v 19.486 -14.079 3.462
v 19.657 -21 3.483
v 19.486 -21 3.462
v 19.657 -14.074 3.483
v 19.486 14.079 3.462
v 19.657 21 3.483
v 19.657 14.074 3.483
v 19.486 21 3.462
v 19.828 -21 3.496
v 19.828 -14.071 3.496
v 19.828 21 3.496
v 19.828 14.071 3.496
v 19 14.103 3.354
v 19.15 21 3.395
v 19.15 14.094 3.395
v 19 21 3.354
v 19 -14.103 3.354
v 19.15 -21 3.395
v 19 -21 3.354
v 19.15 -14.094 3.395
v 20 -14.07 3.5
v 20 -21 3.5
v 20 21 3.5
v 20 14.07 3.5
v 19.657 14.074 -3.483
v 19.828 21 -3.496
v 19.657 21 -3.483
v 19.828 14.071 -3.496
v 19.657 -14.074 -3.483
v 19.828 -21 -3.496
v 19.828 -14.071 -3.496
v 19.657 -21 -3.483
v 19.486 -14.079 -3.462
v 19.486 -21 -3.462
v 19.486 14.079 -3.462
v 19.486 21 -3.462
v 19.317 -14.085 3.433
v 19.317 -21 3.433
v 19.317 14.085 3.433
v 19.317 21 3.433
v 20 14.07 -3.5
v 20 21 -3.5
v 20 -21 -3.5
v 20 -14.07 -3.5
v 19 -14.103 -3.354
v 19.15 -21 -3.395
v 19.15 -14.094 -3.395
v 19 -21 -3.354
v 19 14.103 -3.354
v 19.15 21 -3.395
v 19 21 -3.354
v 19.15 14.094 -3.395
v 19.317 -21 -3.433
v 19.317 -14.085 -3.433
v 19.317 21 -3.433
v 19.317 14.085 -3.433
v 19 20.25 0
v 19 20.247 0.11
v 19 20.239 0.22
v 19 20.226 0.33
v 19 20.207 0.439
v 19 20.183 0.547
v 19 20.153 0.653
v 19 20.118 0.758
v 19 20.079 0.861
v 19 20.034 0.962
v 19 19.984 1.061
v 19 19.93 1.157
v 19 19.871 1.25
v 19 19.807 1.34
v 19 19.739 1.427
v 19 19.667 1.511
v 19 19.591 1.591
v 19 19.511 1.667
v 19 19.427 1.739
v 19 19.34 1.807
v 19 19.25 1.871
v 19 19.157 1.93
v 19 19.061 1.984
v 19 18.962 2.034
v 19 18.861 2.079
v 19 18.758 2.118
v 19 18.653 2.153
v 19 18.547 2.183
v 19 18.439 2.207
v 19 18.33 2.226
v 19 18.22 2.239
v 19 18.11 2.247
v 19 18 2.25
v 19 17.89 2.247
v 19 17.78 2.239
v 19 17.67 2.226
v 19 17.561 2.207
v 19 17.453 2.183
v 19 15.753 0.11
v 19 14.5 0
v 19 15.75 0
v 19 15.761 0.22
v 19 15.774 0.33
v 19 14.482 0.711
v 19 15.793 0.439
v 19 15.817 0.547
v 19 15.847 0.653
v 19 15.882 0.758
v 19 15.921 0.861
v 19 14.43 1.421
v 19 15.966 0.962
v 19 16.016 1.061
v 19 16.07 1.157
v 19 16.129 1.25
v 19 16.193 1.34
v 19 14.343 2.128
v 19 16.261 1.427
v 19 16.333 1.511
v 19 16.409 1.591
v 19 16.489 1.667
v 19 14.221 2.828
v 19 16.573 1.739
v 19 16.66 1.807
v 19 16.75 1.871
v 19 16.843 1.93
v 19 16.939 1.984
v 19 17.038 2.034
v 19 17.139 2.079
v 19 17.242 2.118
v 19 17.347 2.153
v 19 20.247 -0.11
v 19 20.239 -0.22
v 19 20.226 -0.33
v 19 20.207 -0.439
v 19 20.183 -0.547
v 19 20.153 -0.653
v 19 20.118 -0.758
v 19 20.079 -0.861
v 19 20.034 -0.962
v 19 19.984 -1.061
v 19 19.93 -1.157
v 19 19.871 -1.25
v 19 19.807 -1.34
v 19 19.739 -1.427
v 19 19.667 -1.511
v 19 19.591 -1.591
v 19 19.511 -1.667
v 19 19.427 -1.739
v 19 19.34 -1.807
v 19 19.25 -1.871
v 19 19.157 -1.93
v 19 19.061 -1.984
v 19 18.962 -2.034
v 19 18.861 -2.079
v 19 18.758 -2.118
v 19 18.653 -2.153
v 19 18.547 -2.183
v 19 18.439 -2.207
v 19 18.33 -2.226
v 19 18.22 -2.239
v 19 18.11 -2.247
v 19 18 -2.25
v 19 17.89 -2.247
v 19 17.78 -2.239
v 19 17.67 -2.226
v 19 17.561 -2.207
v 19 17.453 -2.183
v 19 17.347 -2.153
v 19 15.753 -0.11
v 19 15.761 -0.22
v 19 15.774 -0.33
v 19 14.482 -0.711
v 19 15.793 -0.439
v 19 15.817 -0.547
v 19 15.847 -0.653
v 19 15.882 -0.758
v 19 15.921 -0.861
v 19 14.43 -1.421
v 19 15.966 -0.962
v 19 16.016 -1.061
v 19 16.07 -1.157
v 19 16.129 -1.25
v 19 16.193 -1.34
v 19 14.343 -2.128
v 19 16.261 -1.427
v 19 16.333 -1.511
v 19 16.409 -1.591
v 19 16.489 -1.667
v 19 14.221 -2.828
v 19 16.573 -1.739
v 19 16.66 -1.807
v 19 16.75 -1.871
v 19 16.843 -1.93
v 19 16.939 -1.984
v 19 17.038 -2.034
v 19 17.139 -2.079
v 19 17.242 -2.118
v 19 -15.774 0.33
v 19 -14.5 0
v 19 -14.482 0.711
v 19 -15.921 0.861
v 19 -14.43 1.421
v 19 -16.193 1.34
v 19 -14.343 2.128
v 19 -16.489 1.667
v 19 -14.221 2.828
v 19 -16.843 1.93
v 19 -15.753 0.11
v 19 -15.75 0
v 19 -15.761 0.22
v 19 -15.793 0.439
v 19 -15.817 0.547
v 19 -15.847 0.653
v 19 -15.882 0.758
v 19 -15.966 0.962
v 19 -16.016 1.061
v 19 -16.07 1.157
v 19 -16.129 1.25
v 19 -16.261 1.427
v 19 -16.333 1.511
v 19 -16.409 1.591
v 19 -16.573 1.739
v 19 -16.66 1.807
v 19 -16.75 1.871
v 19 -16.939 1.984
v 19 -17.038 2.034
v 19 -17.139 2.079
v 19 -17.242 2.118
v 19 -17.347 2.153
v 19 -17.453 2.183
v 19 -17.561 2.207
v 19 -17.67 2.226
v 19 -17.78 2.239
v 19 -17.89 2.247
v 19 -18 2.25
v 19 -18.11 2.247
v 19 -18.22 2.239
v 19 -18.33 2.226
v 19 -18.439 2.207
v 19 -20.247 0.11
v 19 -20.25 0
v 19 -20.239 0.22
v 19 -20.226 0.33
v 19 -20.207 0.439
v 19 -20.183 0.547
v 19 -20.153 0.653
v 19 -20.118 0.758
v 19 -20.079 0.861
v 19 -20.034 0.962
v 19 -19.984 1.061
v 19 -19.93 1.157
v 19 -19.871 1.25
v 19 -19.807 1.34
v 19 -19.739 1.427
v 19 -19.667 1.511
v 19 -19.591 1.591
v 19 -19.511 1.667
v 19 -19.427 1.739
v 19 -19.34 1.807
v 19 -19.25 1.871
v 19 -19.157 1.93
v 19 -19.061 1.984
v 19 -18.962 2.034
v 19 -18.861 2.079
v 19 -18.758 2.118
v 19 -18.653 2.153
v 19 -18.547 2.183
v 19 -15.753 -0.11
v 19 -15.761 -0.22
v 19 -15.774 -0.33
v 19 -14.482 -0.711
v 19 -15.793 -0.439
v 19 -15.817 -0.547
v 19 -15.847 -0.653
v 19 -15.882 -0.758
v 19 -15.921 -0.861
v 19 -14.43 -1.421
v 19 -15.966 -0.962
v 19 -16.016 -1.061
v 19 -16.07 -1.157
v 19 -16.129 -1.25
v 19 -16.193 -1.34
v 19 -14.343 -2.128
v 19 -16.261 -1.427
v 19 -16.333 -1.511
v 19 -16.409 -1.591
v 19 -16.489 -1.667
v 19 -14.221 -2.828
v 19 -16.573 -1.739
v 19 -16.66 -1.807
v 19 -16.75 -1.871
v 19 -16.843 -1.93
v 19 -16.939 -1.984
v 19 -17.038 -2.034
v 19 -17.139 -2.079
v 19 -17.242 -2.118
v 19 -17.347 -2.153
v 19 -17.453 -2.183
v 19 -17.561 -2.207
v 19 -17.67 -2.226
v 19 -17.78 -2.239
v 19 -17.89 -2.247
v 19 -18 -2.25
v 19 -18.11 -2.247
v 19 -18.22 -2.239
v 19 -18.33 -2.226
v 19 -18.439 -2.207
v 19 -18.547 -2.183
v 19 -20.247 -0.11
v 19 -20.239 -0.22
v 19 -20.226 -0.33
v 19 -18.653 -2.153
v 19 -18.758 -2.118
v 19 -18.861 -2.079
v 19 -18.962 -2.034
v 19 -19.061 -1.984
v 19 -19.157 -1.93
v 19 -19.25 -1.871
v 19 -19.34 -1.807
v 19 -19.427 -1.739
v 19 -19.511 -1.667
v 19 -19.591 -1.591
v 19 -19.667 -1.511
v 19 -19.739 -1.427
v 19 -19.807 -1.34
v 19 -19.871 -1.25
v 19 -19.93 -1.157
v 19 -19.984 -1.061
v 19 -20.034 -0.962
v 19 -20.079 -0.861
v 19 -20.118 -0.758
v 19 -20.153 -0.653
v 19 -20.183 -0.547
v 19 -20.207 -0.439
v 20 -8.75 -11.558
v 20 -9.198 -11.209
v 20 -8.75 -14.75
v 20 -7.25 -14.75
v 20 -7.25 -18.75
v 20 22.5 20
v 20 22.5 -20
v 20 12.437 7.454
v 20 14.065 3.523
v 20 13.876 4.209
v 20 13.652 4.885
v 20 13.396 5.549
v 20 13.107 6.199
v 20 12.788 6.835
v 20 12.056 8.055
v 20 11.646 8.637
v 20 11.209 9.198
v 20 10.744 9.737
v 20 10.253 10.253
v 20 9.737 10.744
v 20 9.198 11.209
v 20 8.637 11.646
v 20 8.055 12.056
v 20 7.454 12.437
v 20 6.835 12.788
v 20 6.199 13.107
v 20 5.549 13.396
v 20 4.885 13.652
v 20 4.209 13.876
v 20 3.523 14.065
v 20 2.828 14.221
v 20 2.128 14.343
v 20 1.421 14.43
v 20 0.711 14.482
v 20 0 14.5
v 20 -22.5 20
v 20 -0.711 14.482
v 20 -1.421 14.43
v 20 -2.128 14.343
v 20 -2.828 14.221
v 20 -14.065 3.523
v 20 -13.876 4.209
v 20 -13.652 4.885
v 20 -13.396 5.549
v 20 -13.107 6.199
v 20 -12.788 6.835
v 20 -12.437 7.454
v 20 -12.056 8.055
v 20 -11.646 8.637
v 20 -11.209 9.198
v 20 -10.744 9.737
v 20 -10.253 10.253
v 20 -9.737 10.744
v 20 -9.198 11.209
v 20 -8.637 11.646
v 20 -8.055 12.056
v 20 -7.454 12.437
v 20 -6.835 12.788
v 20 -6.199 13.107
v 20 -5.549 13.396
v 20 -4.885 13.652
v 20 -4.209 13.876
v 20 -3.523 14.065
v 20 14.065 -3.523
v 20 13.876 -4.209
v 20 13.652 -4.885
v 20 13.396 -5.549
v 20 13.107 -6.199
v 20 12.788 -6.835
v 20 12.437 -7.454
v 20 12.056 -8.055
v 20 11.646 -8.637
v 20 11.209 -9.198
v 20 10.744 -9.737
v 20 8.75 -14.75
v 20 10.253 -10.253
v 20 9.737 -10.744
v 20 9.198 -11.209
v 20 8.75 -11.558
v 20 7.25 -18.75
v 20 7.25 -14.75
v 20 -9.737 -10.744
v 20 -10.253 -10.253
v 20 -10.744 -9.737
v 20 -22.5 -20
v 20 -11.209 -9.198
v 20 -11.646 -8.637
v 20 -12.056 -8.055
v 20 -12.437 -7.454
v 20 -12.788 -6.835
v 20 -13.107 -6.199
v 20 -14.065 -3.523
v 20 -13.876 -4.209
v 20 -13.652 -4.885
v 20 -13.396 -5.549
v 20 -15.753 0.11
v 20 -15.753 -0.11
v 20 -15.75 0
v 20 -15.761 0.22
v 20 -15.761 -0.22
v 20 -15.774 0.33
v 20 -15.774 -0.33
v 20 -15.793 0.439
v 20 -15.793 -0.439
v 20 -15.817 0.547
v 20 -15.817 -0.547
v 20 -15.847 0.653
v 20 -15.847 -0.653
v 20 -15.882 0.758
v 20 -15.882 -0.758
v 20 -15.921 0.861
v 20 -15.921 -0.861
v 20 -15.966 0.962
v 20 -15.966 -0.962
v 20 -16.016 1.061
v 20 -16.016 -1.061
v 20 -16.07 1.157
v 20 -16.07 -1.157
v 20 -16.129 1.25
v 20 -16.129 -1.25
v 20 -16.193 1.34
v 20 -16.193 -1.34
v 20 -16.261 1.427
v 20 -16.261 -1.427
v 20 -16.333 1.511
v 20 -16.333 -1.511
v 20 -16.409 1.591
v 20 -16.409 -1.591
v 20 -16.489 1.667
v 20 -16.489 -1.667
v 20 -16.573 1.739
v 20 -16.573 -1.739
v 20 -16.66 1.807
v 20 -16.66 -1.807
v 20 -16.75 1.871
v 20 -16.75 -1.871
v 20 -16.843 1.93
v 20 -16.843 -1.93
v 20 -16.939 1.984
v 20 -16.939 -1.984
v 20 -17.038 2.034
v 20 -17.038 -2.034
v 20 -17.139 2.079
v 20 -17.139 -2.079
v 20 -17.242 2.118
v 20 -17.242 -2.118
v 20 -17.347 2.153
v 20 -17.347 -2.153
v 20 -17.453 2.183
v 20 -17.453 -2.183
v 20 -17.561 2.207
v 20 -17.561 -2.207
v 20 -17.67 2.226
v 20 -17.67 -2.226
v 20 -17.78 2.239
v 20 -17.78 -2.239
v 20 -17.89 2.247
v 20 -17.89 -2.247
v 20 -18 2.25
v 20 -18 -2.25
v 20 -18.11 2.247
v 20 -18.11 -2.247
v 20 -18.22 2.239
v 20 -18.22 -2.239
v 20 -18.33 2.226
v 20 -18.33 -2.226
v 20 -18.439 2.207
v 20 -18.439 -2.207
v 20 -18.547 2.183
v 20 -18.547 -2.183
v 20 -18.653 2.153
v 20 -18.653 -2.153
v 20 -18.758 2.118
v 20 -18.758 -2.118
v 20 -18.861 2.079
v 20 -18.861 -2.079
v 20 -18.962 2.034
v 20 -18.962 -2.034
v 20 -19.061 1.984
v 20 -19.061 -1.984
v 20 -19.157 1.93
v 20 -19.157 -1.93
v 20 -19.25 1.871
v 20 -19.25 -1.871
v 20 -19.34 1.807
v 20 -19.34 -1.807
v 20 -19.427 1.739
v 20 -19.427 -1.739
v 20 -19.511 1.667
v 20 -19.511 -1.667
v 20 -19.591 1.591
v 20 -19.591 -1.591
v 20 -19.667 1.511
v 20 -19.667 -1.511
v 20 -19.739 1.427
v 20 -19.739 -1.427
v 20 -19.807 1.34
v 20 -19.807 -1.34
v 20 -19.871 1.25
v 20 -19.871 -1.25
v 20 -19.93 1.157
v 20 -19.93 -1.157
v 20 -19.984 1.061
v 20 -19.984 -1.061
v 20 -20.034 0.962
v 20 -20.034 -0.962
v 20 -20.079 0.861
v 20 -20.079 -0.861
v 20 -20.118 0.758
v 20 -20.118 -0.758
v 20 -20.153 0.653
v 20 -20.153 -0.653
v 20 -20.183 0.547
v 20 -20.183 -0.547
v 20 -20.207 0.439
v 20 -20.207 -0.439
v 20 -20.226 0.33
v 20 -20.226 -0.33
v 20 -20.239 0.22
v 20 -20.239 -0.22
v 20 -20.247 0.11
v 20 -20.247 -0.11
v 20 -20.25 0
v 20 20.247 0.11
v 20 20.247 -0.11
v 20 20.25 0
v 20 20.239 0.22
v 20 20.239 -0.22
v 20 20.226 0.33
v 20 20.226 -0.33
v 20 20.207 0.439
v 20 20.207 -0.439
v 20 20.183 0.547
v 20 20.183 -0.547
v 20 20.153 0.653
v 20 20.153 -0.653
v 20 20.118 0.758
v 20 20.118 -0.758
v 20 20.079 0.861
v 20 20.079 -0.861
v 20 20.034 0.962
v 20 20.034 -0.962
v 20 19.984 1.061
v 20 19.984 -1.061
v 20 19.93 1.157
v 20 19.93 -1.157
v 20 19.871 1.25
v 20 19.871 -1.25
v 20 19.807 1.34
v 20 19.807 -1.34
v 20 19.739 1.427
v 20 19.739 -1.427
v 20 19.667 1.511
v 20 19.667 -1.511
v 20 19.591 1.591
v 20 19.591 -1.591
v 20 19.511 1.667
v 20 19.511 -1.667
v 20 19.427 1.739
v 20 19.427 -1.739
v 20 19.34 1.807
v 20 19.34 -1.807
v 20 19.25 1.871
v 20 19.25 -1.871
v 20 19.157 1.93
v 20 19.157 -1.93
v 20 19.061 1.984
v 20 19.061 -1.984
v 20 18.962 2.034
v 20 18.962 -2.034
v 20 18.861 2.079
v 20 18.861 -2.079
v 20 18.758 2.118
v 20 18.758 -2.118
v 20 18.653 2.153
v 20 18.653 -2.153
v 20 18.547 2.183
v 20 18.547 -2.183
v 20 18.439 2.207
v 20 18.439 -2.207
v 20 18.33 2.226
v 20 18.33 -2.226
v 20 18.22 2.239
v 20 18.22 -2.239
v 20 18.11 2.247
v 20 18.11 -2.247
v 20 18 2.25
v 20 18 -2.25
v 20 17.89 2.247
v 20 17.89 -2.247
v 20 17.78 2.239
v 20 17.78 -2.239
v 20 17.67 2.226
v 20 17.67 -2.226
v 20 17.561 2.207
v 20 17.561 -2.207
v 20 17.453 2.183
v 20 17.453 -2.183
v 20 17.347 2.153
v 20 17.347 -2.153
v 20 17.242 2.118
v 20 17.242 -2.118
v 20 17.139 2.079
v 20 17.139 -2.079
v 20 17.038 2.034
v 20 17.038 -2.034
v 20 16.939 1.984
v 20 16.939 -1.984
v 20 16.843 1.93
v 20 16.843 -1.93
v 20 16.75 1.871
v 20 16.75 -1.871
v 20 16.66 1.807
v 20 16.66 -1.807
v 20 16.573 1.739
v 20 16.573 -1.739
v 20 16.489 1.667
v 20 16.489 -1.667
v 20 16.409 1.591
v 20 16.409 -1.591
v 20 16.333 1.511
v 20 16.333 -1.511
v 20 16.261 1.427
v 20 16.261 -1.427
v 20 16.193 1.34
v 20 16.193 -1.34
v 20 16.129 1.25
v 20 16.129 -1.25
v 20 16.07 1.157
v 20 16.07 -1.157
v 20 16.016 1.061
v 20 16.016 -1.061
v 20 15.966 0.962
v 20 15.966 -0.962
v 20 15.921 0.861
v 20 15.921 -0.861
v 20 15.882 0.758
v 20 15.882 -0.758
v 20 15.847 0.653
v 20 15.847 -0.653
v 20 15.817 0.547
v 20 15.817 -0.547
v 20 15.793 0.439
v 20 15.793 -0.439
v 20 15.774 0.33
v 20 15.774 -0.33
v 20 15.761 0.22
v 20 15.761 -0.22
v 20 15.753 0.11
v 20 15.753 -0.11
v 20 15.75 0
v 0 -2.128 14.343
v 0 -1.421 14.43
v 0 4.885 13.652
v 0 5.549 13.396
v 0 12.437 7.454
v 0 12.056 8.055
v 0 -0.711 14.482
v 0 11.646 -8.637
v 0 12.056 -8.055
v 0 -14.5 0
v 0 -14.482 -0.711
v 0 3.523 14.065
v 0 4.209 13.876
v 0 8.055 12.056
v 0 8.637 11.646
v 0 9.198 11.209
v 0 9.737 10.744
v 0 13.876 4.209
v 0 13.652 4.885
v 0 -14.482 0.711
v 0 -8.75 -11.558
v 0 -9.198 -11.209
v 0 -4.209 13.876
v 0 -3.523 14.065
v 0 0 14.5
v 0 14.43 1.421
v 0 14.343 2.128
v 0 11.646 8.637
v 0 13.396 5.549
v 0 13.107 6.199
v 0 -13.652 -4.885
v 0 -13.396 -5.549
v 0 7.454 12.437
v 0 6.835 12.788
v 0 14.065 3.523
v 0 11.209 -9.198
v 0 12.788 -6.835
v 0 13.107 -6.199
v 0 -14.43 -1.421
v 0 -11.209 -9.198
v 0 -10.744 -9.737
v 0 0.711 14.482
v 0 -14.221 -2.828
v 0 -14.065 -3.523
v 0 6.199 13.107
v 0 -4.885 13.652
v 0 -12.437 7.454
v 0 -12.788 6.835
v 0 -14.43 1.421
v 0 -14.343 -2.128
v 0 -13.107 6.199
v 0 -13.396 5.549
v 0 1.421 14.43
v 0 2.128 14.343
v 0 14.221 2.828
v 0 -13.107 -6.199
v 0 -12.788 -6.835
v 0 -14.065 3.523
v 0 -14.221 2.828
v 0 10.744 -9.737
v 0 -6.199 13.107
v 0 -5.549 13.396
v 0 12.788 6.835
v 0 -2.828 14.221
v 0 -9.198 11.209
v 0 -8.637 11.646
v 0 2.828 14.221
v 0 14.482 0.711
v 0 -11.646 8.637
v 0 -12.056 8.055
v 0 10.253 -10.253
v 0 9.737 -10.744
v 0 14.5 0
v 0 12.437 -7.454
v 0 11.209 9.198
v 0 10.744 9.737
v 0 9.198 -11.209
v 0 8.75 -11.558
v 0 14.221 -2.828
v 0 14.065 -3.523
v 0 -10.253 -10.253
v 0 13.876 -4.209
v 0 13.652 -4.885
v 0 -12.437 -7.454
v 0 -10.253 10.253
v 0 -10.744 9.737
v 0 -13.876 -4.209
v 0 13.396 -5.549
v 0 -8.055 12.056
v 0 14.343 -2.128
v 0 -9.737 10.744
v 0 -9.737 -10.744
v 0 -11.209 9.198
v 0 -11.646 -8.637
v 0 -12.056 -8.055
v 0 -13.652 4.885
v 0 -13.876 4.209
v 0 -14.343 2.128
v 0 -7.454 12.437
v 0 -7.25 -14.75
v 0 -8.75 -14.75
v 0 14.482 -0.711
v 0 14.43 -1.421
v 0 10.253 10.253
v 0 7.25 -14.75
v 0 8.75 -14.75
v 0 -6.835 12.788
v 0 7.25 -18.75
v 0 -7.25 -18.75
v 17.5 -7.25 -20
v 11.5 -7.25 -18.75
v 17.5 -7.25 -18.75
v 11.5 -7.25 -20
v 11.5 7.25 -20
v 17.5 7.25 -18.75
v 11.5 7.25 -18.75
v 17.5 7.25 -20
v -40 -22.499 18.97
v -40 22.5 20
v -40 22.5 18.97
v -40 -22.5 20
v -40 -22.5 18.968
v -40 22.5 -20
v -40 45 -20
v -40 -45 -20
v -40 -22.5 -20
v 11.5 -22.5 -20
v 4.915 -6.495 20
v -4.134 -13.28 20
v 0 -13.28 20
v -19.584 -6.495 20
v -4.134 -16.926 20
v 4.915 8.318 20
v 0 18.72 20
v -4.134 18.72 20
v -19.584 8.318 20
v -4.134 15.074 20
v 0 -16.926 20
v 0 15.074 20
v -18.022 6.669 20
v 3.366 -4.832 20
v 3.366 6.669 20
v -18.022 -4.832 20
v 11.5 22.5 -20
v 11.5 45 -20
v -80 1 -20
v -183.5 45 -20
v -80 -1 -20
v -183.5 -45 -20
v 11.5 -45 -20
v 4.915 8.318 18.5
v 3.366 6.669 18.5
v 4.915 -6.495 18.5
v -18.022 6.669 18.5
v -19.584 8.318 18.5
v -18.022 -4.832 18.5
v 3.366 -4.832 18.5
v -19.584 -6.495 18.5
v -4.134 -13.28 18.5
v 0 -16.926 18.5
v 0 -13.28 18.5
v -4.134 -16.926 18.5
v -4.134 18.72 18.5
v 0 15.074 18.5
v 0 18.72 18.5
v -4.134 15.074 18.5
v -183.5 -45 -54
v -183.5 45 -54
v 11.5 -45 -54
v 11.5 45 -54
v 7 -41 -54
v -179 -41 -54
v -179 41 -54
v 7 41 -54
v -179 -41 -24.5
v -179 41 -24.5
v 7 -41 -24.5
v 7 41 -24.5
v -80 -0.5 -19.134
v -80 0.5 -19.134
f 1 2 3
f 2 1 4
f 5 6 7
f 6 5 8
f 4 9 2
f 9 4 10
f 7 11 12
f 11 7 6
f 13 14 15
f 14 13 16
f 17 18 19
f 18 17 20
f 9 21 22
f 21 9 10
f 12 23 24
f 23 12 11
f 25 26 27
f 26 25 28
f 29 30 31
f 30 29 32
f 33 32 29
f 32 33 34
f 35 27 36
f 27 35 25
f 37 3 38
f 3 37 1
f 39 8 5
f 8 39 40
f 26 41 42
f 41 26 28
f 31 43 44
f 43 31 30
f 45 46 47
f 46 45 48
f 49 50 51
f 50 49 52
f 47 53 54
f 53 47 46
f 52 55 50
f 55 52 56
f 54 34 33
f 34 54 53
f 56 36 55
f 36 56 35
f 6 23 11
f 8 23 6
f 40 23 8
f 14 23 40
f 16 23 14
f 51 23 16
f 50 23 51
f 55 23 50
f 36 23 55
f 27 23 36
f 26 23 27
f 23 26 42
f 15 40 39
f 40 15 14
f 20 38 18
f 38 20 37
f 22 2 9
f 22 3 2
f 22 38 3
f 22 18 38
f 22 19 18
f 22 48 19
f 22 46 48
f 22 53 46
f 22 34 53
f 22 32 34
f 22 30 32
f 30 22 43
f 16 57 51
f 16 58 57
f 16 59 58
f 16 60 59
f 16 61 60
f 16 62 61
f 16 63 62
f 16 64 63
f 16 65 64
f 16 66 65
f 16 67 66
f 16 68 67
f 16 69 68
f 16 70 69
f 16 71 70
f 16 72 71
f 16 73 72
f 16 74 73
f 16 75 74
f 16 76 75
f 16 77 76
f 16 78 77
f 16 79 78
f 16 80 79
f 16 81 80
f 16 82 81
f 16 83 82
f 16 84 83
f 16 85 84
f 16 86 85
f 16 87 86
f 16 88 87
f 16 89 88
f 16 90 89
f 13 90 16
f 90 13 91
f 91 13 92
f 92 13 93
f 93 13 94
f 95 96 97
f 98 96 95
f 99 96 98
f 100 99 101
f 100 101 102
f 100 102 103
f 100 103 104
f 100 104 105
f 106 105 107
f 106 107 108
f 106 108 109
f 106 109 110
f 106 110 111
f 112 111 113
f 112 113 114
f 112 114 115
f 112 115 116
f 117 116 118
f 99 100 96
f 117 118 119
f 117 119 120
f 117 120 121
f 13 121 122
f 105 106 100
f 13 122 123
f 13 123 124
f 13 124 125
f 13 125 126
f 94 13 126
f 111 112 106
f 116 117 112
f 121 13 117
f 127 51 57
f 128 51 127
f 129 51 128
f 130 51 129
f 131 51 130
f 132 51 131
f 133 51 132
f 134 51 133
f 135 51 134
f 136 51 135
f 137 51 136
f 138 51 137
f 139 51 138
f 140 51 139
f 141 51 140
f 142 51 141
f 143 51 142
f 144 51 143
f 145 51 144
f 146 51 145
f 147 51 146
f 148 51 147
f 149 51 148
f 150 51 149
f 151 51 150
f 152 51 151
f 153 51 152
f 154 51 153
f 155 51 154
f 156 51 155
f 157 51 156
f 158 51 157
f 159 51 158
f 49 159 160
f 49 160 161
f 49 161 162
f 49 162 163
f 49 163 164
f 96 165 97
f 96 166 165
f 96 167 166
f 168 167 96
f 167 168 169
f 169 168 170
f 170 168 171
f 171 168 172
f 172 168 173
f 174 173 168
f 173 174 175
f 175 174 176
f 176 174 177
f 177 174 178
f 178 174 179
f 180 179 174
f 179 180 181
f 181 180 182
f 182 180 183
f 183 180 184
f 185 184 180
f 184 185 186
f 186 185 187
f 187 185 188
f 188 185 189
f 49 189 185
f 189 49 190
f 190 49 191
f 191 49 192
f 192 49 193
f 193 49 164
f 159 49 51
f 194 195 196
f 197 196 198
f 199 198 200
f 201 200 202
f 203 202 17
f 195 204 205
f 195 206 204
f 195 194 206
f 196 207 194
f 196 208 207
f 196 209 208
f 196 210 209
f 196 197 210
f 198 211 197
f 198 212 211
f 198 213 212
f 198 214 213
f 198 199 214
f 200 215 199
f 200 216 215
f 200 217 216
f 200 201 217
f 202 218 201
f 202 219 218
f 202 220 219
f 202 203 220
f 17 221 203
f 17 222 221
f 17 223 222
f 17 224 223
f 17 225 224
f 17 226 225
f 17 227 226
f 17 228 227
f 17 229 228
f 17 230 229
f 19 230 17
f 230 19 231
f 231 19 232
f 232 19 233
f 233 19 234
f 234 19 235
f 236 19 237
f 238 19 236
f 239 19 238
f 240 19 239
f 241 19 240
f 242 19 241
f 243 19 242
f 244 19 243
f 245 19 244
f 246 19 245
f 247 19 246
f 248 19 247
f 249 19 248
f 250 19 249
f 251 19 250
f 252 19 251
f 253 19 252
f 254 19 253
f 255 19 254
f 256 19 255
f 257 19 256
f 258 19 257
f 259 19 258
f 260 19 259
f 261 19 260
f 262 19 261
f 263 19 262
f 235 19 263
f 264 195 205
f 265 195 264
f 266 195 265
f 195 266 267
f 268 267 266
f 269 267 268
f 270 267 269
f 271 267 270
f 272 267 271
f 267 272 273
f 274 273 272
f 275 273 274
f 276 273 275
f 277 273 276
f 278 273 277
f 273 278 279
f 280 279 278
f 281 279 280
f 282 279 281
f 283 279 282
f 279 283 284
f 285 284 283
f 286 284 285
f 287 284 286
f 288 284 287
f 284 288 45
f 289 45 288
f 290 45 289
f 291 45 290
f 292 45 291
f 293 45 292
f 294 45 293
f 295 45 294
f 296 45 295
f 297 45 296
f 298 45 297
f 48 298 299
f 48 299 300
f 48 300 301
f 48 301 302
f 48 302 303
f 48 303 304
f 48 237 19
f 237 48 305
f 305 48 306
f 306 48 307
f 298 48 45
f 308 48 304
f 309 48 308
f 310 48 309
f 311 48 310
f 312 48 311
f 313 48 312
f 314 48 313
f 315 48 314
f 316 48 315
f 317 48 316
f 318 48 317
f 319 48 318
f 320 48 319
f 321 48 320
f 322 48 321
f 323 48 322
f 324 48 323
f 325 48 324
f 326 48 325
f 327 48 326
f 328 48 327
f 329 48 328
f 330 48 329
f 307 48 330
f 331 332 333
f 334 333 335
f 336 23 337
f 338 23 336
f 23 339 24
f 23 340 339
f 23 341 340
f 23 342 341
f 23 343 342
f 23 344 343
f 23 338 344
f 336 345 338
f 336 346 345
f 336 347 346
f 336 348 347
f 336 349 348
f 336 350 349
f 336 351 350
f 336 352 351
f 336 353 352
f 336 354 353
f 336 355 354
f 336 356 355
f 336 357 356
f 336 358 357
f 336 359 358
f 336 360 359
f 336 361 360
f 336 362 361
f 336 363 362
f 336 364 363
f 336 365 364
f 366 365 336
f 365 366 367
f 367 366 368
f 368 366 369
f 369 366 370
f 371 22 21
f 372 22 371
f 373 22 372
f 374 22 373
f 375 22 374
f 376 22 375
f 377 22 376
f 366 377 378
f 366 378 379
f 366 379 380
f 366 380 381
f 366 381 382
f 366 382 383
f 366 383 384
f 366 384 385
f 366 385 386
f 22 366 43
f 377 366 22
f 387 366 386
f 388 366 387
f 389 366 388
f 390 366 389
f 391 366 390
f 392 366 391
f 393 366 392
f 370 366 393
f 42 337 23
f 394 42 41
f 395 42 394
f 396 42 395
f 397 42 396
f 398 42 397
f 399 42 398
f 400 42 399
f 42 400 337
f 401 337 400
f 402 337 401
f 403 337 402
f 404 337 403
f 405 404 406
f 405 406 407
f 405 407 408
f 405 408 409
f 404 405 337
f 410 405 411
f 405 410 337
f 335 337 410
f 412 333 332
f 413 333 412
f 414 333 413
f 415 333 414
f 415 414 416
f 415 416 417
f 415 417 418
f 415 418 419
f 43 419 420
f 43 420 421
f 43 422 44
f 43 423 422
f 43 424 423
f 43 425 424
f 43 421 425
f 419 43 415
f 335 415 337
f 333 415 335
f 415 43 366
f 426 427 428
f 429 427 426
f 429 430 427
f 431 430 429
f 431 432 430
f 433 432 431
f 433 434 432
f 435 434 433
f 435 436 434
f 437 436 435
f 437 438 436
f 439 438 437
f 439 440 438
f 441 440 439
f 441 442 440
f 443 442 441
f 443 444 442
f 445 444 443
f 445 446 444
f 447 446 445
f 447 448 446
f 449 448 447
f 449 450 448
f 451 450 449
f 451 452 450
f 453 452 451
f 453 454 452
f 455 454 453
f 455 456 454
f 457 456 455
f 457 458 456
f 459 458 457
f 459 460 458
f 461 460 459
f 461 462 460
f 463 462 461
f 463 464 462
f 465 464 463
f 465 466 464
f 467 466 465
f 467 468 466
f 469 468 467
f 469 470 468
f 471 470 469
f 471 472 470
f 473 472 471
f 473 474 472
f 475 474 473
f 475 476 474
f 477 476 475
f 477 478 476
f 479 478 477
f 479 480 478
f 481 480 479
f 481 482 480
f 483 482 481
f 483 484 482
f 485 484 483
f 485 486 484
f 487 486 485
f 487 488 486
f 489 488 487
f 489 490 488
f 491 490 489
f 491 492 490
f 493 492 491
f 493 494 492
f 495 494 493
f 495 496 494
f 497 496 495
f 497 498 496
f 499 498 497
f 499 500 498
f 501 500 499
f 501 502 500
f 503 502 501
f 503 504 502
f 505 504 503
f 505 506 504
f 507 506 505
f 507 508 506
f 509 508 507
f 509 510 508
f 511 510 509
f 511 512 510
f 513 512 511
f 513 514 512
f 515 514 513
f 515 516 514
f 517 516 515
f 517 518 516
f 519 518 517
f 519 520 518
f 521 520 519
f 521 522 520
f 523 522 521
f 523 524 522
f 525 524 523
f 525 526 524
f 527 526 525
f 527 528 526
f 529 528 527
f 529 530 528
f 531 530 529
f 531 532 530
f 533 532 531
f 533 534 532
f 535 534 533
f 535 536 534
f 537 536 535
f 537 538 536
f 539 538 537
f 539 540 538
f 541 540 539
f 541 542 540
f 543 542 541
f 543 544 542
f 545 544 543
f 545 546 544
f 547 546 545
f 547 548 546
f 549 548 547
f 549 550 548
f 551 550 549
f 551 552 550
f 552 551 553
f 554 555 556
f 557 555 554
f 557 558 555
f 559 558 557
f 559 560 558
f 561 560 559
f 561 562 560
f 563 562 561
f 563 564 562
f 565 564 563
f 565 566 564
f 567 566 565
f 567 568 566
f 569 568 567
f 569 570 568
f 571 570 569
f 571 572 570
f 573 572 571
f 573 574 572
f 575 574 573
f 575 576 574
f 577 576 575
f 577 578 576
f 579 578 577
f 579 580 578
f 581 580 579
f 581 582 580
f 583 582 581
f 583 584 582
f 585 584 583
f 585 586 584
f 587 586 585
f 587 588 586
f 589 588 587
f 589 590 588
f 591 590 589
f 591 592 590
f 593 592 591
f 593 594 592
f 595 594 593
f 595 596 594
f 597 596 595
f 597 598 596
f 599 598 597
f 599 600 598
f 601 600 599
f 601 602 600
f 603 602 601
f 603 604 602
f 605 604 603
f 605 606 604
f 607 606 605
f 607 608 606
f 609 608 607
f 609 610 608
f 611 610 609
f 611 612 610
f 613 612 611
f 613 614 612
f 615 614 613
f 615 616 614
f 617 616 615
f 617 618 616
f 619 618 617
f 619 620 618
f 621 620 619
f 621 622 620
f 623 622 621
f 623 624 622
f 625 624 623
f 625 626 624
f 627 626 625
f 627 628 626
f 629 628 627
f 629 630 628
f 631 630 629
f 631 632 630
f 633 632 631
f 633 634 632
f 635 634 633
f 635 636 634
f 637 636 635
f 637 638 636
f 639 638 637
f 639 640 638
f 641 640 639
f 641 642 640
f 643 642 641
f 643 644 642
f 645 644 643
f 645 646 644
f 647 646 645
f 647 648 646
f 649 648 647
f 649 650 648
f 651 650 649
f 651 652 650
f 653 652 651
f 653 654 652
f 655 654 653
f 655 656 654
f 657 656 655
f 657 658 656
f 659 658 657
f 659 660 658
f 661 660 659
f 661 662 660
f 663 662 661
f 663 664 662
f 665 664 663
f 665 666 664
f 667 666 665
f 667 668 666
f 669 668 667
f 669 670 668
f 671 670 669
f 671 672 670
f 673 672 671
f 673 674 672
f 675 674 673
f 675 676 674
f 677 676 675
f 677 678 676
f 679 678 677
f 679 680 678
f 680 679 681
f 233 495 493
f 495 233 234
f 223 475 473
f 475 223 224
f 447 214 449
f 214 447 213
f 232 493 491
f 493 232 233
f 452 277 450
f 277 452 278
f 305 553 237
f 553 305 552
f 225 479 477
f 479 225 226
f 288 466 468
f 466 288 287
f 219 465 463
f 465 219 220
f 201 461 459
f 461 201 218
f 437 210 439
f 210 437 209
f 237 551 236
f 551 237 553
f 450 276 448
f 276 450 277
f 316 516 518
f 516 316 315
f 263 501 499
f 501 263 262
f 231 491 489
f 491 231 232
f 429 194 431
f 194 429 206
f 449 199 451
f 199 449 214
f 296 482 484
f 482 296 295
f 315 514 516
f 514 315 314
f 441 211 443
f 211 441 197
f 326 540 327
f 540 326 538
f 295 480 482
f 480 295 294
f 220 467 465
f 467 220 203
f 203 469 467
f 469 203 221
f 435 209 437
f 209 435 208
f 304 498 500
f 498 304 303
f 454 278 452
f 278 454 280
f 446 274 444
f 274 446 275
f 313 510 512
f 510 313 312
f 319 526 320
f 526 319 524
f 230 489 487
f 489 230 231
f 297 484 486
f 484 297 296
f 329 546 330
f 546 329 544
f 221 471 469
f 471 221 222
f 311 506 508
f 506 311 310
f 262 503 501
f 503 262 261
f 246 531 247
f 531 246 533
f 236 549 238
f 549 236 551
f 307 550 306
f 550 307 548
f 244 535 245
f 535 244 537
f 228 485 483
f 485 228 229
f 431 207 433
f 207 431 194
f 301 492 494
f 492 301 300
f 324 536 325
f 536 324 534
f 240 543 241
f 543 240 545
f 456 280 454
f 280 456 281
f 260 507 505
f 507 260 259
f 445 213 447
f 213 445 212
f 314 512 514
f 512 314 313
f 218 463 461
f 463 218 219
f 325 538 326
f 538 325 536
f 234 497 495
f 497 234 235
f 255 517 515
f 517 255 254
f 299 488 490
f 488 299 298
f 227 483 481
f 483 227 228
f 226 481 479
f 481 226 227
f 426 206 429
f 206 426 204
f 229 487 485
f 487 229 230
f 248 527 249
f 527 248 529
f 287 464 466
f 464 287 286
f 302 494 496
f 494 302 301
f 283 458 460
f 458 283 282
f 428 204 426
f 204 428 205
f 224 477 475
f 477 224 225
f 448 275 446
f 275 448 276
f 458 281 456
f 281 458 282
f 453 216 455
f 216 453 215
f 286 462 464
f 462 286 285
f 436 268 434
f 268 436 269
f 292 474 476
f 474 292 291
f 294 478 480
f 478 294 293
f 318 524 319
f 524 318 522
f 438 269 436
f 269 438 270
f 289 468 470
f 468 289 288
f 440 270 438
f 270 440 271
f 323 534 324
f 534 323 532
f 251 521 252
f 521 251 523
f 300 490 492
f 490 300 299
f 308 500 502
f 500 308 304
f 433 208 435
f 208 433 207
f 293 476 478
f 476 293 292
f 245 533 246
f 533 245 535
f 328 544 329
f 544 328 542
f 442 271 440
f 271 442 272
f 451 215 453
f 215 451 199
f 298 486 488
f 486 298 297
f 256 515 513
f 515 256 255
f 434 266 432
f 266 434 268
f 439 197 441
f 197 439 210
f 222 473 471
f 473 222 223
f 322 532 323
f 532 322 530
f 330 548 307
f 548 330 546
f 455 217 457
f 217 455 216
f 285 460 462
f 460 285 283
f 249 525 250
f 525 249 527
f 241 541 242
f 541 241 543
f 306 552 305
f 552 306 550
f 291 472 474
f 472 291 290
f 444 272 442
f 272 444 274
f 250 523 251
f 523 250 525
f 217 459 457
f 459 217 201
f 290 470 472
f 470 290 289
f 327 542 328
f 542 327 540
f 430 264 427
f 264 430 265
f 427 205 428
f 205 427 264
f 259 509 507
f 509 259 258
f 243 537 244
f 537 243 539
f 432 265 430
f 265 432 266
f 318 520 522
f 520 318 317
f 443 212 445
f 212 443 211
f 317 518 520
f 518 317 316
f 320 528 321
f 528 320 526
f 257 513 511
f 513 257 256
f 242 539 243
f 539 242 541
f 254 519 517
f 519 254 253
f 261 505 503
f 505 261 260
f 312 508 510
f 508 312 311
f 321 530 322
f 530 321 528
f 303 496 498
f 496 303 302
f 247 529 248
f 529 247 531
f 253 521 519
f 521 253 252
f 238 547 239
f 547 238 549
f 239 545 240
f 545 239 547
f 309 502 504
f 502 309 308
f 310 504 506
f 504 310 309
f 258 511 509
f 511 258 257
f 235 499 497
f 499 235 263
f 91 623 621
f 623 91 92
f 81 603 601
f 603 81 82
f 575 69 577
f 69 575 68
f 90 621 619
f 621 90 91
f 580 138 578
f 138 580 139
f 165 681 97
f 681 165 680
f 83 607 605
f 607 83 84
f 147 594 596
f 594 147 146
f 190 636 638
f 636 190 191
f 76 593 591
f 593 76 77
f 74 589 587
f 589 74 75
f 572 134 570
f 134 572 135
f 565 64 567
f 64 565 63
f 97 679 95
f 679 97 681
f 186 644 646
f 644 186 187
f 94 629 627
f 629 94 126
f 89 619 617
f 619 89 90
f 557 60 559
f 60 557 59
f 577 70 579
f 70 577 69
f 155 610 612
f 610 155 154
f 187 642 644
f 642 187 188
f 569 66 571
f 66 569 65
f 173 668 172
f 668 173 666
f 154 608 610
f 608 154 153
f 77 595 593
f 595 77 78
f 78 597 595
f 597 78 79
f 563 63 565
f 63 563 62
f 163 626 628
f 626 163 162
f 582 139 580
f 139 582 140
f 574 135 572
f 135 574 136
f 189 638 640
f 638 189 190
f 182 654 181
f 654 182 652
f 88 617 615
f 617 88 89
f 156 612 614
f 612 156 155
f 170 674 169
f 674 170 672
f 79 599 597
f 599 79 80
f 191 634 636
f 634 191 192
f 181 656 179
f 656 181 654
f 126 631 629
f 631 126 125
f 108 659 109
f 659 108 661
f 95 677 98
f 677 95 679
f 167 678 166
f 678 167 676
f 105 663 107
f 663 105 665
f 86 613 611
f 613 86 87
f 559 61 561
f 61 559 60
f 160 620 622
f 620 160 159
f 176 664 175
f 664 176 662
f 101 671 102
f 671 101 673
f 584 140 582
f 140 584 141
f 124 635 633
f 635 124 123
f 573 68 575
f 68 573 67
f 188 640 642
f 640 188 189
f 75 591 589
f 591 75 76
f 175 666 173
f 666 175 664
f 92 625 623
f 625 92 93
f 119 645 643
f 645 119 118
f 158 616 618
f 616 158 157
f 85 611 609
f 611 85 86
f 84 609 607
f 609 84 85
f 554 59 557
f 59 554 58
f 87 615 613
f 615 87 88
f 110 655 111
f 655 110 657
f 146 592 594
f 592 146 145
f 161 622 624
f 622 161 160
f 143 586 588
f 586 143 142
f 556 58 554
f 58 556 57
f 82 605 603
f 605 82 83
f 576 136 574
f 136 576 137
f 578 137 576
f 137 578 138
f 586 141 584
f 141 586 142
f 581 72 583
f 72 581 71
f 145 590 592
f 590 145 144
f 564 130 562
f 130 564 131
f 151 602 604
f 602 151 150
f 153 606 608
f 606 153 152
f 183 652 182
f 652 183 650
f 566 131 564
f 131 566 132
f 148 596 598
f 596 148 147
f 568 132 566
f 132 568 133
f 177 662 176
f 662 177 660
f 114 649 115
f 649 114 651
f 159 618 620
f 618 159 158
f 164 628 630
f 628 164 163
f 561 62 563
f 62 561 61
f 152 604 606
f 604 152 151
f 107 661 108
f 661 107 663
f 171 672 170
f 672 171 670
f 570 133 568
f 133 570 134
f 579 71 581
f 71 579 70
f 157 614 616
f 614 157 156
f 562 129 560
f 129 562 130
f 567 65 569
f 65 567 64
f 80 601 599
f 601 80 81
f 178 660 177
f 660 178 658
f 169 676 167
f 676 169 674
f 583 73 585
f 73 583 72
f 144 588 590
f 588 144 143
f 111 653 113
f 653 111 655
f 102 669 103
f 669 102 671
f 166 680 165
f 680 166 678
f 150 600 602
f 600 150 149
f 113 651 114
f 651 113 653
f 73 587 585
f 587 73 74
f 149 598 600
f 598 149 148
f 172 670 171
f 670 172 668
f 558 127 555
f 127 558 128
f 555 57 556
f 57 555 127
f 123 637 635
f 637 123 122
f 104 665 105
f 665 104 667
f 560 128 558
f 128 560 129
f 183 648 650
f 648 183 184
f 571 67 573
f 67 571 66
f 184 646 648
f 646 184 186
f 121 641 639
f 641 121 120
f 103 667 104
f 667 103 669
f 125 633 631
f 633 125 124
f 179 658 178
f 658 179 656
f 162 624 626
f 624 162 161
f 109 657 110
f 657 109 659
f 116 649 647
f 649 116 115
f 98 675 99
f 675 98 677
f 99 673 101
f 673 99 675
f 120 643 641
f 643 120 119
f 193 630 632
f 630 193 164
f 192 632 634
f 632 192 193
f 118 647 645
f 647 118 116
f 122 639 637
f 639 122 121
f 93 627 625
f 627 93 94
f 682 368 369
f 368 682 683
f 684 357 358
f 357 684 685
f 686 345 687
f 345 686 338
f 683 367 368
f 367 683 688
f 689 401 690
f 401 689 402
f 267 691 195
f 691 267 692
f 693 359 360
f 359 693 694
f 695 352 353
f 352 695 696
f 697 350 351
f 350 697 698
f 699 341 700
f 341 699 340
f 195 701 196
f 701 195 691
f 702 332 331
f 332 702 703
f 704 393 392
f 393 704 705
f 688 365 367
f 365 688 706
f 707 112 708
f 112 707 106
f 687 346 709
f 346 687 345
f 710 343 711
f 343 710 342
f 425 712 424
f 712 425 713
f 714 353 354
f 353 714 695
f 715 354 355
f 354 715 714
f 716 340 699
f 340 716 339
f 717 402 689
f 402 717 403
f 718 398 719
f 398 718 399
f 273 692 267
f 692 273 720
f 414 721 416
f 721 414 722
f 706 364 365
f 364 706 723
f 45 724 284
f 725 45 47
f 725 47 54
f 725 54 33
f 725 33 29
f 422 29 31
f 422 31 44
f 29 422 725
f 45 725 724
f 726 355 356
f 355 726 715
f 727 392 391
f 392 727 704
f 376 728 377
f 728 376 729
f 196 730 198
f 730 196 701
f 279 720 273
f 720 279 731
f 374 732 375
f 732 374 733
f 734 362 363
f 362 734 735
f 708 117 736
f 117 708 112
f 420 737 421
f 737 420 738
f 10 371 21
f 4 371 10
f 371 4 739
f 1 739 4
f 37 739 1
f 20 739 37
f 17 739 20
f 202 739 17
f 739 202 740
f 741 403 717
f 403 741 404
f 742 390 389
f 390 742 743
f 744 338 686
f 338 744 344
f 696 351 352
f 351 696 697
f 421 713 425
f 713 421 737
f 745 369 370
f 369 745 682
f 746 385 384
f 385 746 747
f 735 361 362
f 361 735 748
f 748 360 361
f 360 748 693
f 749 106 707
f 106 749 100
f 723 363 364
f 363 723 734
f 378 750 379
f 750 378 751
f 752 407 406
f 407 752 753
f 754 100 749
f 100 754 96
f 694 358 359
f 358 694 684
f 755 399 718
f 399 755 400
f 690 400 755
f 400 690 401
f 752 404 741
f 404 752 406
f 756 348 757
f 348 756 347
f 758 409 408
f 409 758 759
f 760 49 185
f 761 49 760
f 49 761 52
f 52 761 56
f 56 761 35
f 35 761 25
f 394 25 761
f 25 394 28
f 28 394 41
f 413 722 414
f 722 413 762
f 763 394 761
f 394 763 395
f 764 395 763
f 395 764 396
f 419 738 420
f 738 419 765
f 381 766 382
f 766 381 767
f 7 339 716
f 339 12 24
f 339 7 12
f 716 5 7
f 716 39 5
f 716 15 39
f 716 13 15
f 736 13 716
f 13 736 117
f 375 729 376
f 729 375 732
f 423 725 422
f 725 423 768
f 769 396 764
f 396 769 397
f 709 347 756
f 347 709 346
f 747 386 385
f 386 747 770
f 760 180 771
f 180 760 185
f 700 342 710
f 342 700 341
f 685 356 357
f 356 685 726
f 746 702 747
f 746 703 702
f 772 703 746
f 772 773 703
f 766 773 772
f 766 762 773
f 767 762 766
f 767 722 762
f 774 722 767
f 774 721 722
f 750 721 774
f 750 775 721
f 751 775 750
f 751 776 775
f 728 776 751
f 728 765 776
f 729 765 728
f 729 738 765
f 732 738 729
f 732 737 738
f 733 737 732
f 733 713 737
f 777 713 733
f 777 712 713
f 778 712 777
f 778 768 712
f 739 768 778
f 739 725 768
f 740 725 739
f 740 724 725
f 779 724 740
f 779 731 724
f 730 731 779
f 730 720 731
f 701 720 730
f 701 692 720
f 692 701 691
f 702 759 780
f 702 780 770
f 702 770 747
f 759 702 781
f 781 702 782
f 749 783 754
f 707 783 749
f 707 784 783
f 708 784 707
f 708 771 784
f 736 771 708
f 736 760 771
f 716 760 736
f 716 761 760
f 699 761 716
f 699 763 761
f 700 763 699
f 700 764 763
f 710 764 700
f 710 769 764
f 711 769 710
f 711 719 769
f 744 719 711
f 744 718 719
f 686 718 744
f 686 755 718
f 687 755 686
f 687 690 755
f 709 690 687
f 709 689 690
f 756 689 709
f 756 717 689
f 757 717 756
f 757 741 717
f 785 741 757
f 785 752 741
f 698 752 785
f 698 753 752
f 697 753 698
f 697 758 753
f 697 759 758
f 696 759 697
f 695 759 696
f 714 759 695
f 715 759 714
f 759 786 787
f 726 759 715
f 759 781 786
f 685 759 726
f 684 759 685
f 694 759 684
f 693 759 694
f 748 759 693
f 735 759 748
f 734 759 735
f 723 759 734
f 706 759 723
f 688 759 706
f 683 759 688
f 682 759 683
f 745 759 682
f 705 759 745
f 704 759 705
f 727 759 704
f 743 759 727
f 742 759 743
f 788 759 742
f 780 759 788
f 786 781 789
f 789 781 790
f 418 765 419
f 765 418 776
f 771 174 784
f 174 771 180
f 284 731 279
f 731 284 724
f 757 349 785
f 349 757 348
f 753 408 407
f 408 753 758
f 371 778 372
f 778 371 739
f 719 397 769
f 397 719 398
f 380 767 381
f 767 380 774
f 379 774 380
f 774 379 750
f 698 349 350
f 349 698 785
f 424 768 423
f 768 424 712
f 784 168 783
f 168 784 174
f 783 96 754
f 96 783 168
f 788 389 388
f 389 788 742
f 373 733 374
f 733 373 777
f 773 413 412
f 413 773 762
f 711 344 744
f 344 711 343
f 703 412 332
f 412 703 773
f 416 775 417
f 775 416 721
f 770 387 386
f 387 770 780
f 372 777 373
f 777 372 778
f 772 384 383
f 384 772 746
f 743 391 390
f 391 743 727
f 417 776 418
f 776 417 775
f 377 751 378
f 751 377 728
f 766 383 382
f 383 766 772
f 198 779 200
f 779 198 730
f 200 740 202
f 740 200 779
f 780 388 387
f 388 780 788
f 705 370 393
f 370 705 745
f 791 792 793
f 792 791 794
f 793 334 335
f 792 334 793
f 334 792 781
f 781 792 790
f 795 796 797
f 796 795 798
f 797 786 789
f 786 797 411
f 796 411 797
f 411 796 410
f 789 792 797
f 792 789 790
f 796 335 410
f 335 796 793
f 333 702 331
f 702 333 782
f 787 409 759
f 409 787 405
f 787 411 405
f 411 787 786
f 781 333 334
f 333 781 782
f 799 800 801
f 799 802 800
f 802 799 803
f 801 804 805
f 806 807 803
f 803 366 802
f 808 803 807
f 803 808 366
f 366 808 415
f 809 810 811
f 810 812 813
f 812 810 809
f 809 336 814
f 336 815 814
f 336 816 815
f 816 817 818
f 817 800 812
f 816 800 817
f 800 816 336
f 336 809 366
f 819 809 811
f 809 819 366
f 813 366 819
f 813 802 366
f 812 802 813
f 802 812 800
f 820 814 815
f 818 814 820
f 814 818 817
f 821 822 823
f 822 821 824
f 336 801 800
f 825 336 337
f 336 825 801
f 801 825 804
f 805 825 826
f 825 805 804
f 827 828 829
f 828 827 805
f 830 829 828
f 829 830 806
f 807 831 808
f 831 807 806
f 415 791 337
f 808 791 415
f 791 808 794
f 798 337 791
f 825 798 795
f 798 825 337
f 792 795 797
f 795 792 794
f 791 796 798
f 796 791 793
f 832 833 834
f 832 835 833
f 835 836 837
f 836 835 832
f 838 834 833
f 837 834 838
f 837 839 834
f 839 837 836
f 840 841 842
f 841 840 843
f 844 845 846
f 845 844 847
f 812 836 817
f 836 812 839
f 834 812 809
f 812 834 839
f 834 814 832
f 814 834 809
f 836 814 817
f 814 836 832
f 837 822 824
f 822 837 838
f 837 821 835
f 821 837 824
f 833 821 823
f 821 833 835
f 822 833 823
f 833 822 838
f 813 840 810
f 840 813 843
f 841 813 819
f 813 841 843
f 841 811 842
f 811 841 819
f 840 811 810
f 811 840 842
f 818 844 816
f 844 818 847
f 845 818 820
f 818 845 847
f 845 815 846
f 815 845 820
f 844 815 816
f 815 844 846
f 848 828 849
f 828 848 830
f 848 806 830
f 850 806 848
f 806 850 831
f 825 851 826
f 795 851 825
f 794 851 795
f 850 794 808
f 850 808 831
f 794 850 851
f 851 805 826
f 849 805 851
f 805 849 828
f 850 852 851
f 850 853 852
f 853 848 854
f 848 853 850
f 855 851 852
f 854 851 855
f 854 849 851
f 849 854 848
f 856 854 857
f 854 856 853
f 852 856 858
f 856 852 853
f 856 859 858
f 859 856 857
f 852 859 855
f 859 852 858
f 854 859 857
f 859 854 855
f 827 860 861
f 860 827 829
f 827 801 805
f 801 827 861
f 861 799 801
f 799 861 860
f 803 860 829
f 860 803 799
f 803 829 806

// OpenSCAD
rotate([270.0, 0.0, 0.0])
{
    rotate([0.0, 90.0, 0.0])
    {
        union()
        {
            union()
            {
                difference()
                {
                    translate([0.0, 0.0, -40.0])
                    {
                        linear_extrude(height = 60.0, twist = 0.0, scale = 1.0, slices = 1, center = false)
                        {
                            scale([45.0, 40.0])
                            {
                                M8();
                            }
                        }
                    }
                    union()
                    {
                        linear_extrude(height = 20.0, twist = 0.0, scale = 1.0, slices = 1, center = false)
                        {
                            scale([29.0, 29.0])
                            {
                                M221();
                            }
                        }
                        translate([0.0, 11.5, 0.0])
                        {
                            linear_extrude(height = 20.0, twist = 0.0, scale = 1.0, slices = 1, center = false)
                            {
                                scale([14.5, 14.5])
                                {
                                    M8();
                                }
                            }
                        }
                        translate([0.0, 6.0, 0.0])
                        {
                            linear_extrude(height = 20.0, twist = 0.0, scale = 1.0, slices = 1, center = false)
                            {
                                scale([17.5, 17.5])
                                {
                                    M8();
                                }
                            }
                        }
                        difference()
                        {
                            intersection()
                            {
                                translate([-21.0, 0.0, 0.0])
                                {
                                    translate([0.0, 0.0, 20.0])
                                    {
                                        rotate([0.0, 90.0, 0.0])
                                        {
                                            linear_extrude(height = 42.0, twist = 0.0, scale = 1.0, slices = 1, center = false)
                                            {
                                                scale([7.0, 7.0])
                                                {
                                                    M221();
                                                }
                                            }
                                        }
                                    }
                                }
                                translate([0.0, 0.0, 0.0])
                                {
                                    translate([0.0, 0.0, 19.0])
                                    {
                                        linear_extrude(height = 1.0, twist = 0.0, scale = 1.0, slices = 1, center = false)
                                        {
                                            scale([42.0, 7.0])
                                            {
                                                M8();
                                            }
                                        }
                                    }
                                }
                            }
                            translate([18.0, 0.0, 0.0])
                            {
                                linear_extrude(height = 50.0, twist = 0.0, scale = 1.0, slices = 1, center = false)
                                {
                                    scale([4.5, 4.5])
                                    {
                                        M221();
                                    }
                                }
                            }
                            translate([-18.0, 0.0, 0.0])
                            {
                                linear_extrude(height = 50.0, twist = 0.0, scale = 1.0, slices = 1, center = false)
                                {
                                    scale([4.5, 4.5])
                                    {
                                        M221();
                                    }
                                }
                            }
                        }
                    }
                    translate([0.0, 20.0, 0.0])
                    {
                        translate([0.0, 0.0, 11.5])
                        {
                            linear_extrude(height = 6.0, twist = 0.0, scale = 1.0, slices = 1, center = false)
                            {
                                scale([14.5, 7.0])
                                {
                                    M8();
                                }
                            }
                        }
                    }
                    translate([0.0, -20.0, 0.0])
                    {
                        translate([24.0, 0.0, 0.0])
                        {
                            translate([0.0, 0.0, 0.0])
                            {
                                rotate([0.0, 180.0, 0.0])
                                {
                                    rotate([90.0, 0.0, 0.0])
                                    {
                                        linear_extrude(height = 3.0, twist = 0.0, scale = 1.0, slices = 1, center = true)
                                        {
                                            union()
                                            {
                                                translate([0.0, 0.0])
                                                {
                                                    M117();
                                                }
                                                translate([16.0, 0.0])
                                                {
                                                    M119();
                                                }
                                                translate([32.0, 0.0])
                                                {
                                                    M117();
                                                }
                                            }
                                        }
                                    }
                                }
                            }
                        }
                    }
                }
                difference()
                {
                    translate([0.0, 37.0, 0.0])
                    {
                        translate([0.0, 0.0, -183.5])
                        {
                            linear_extrude(height = 195.0, twist = 0.0, scale = 1.0, slices = 1, center = false)
                            {
                                scale([90.0, 34.0])
                                {
                                    M8();
                                }
                            }
                        }
                    }
                    translate([0.0, 39.5, 0.0])
                    {
                        translate([0.0, 0.0, -179.0])
                        {
                            linear_extrude(height = 186.0, twist = 0.0, scale = 1.0, slices = 1, center = false)
                            {
                                scale([82.0, 30.0])
                                {
                                    M8();
                                }
                            }
                        }
                    }
                }
                translate([0.0, 20.0, 0.0])
                {
                    translate([0.0, 0.0, -80.0])
                    {
                        translate([0.0, 0.0, 20.0])
                        {
                            mirror([0.0, 0.0, 1.0])
                            {
                                linear_extrude(height = 40.0, twist = 0.0, scale = 0.022222222222222223, slices = 1, center = true)
                                {
                                    intersection()
                                    {
                                        scale([90.0, 90.0])
                                        {
                                            M226();
                                        }
                                        M235();
                                    }
                                }
                            }
                        }
                    }
                }
            }
            difference()
            {
                translate([0.0, 37.0, 0.0])
                {
                    translate([0.0, 0.0, -183.5])
                    {
                        linear_extrude(height = 195.0, twist = 0.0, scale = 1.0, slices = 1, center = false)
                        {
                            scale([90.0, 34.0])
                            {
                                M8();
                            }
                        }
                    }
                }
                translate([0.0, 39.5, 0.0])
                {
                    translate([0.0, 0.0, -179.0])
                    {
                        linear_extrude(height = 186.0, twist = 0.0, scale = 1.0, slices = 1, center = false)
                        {
                            scale([82.0, 30.0])
                            {
                                M8();
                            }
                        }
                    }
                }
            }
        }
    }
}

module M226()
{
    polygon
    (
        points =
        [
            [0.5, 0.0], 
            [0.25000000000000006, 0.4330127018922193], 
            [-0.2499999999999999, 0.43301270189221935], 
            [-0.5, 6.123233995736766E-17], 
            [-0.2500000000000002, -0.4330127018922192], 
            [0.24999999999999967, -0.4330127018922195]
        ],
        paths =
        [
            [0, 1, 2, 3, 4, 5]
        ]
    );
}

module M117()
{
    scale([2.1333333333333333, 2.0])
    {
        text
        (
            text = ".",
            size = 10.0,
            font = "Consolas:style=Regular",
            halign = "left",
            valign = "baseline",
            spacing = 1.0,
            direction = "ltr",
            language = "en",
            script = "latin",
            $fn = 64
        );
    }
}

module M119()
{
    scale([2.1333333333333333, 2.0])
    {
        text
        (
            text = "͜",
            size = 10.0,
            font = "Consolas:style=Regular",
            halign = "left",
            valign = "baseline",
            spacing = 1.0,
            direction = "ltr",
            language = "en",
            script = "latin",
            $fn = 64
        );
    }
}

module M8()
{
    polygon
    (
        points =
        [
            [-0.5, -0.5], 
            [0.5, -0.5], 
            [0.5, 0.5], 
            [-0.5, 0.5]
        ],
        paths =
        [
            [0, 1, 2, 3]
        ]
    );
}

module M235()
{
    polygon
    (
        points =
        [
            [0.0, 0.0], 
            [-90.0, 1.1021821192326179E-14], 
            [-83.14915792601582, -34.44150891285807], 
            [-63.639610306789294, -63.63961030678927], 
            [-34.44150891285813, -83.14915792601579], 
            [-1.6532731788489267E-14, -90.0], 
            [34.4415089128581, -83.1491579260158], 
            [63.63961030678926, -63.639610306789294], 
            [83.14915792601579, -34.44150891285813], 
            [90.0, -2.2043642384652358E-14]
        ],
        paths =
        [
            [0, 1, 2, 3, 4, 5, 6, 7, 8, 9]
        ]
    );
}

module M221()
{
    polygon
    (
        points =
        [
            [0.5, 0.0], 
            [0.4993977281025862, 0.024533837163709007], 
            [0.49759236333609846, 0.0490085701647803], 
            [0.4945882549823905, 0.07336523722768087], 
            [0.4903926402016152, 0.09754516100806412], 
            [0.485015626597272, 0.12149008995163194], 
            [0.4784701678661044, 0.14514233862723117], 
            [0.4707720325915104, 0.16844492669611003], 
            [0.46193976625564337, 0.1913417161825449], 
            [0.45199464656172167, 0.21377754671514104], 
            [0.4409606321741775, 0.23569836841299882], 
            [0.42886430500013606, 0.25705137209661083], 
            [0.4157348061512726, 0.2777851165098011], 
            [0.40160376574032247, 0.2978496522462167], 
            [0.3865052266813685, 0.31719664208182274], 
            [0.37047556267747955, 0.33577947742350917], 
            [0.3535533905932738, 0.35355339059327373], 
            [0.33577947742350917, 0.37047556267747955], 
            [0.31719664208182274, 0.3865052266813685], 
            [0.29784965224621673, 0.4016037657403224], 
            [0.27778511650980114, 0.4157348061512726], 
            [0.25705137209661083, 0.42886430500013606], 
            [0.2356983684129989, 0.44096063217417747], 
            [0.2137775467151411, 0.45199464656172167], 
            [0.19134171618254492, 0.46193976625564337], 
            [0.16844492669611003, 0.4707720325915104], 
            [0.14514233862723117, 0.47847016786610447], 
            [0.12149008995163199, 0.485015626597272], 
            [0.09754516100806417, 0.4903926402016152], 
            [0.07336523722768087, 0.4945882549823905], 
            [0.049008570164780385, 0.4975923633360984], 
            [0.024533837163709063, 0.4993977281025862], 
            [3.061616997868383E-17, 0.5], 
            [-0.024533837163709004, 0.4993977281025862], 
            [-0.04900857016478032, 0.49759236333609846], 
            [-0.07336523722768082, 0.4945882549823905], 
            [-0.0975451610080641, 0.4903926402016152], 
            [-0.12149008995163194, 0.485015626597272], 
            [-0.14514233862723108, 0.47847016786610447], 
            [-0.16844492669610997, 0.4707720325915104], 
            [-0.19134171618254486, 0.46193976625564337], 
            [-0.21377754671514093, 0.4519946465617217], 
            [-0.23569836841299885, 0.4409606321741775], 
            [-0.25705137209661083, 0.42886430500013606], 
            [-0.277785116509801, 0.41573480615127273], 
            [-0.2978496522462167, 0.40160376574032247], 
            [-0.3171966420818227, 0.38650522668136855], 
            [-0.3357794774235092, 0.3704755626774795], 
            [-0.35355339059327373, 0.3535533905932738], 
            [-0.37047556267747944, 0.3357794774235093], 
            [-0.3865052266813685, 0.31719664208182274], 
            [-0.4016037657403224, 0.29784965224621673], 
            [-0.4157348061512727, 0.2777851165098011], 
            [-0.428864305000136, 0.2570513720966109], 
            [-0.44096063217417747, 0.23569836841299893], 
            [-0.45199464656172167, 0.21377754671514101], 
            [-0.46193976625564337, 0.19134171618254495], 
            [-0.47077203259151035, 0.16844492669611016], 
            [-0.4784701678661044, 0.1451423386272312], 
            [-0.485015626597272, 0.12149008995163203], 
            [-0.4903926402016152, 0.0975451610080643], 
            [-0.4945882549823905, 0.0733652372276809], 
            [-0.4975923633360984, 0.04900857016478041], 
            [-0.4993977281025862, 0.024533837163708983], 
            [-0.5, 6.123233995736766E-17], 
            [-0.4993977281025862, -0.024533837163708862], 
            [-0.49759236333609846, -0.049008570164780295], 
            [-0.4945882549823905, -0.07336523722768079], 
            [-0.4903926402016152, -0.09754516100806418], 
            [-0.485015626597272, -0.12149008995163191], 
            [-0.47847016786610447, -0.14514233862723105], 
            [-0.4707720325915104, -0.16844492669611005], 
            [-0.4619397662556434, -0.19134171618254484], 
            [-0.4519946465617217, -0.2137775467151409], 
            [-0.4409606321741775, -0.23569836841299882], 
            [-0.42886430500013606, -0.2570513720966108], 
            [-0.41573480615127273, -0.277785116509801], 
            [-0.40160376574032247, -0.2978496522462166], 
            [-0.38650522668136855, -0.31719664208182263], 
            [-0.37047556267747955, -0.3357794774235092], 
            [-0.35355339059327384, -0.35355339059327373], 
            [-0.33577947742350933, -0.37047556267747944], 
            [-0.31719664208182297, -0.38650522668136833], 
            [-0.29784965224621657, -0.4016037657403225], 
            [-0.2777851165098011, -0.4157348061512726], 
            [-0.2570513720966109, -0.428864305000136], 
            [-0.23569836841299893, -0.44096063217417747], 
            [-0.21377754671514124, -0.45199464656172156], 
            [-0.19134171618254517, -0.46193976625564326], 
            [-0.16844492669610997, -0.4707720325915104], 
            [-0.14514233862723122, -0.4784701678661044], 
            [-0.12149008995163206, -0.485015626597272], 
            [-0.09754516100806433, -0.49039264020161516], 
            [-0.07336523722768115, -0.49458825498239045], 
            [-0.049008570164780225, -0.49759236333609846], 
            [-0.024533837163709014, -0.4993977281025862], 
            [-9.184850993605148E-17, -0.5], 
            [0.02453383716370883, -0.4993977281025862], 
            [0.049008570164780045, -0.49759236333609846], 
            [0.07336523722768097, -0.49458825498239045], 
            [0.09754516100806415, -0.4903926402016152], 
            [0.12149008995163188, -0.485015626597272], 
            [0.14514233862723103, -0.47847016786610447], 
            [0.1684449266961098, -0.47077203259151046], 
            [0.191341716182545, -0.4619397662556433], 
            [0.21377754671514107, -0.45199464656172167], 
            [0.2356983684129988, -0.4409606321741775], 
            [0.2570513720966108, -0.4288643050001361], 
            [0.2777851165098009, -0.41573480615127273], 
            [0.29784965224621646, -0.40160376574032264], 
            [0.3171966420818228, -0.38650522668136844], 
            [0.33577947742350917, -0.37047556267747955], 
            [0.3535533905932737, -0.35355339059327384], 
            [0.37047556267747944, -0.33577947742350933], 
            [0.38650522668136833, -0.31719664208182297], 
            [0.4016037657403225, -0.2978496522462166], 
            [0.4157348061512726, -0.2777851165098011], 
            [0.428864305000136, -0.25705137209661094], 
            [0.4409606321741774, -0.23569836841299896], 
            [0.45199464656172156, -0.21377754671514126], 
            [0.46193976625564326, -0.1913417161825452], 
            [0.4707720325915104, -0.16844492669611], 
            [0.4784701678661044, -0.14514233862723125], 
            [0.485015626597272, -0.12149008995163209], 
            [0.49039264020161516, -0.09754516100806436], 
            [0.49458825498239045, -0.0733652372276812], 
            [0.49759236333609846, -0.04900857016478025], 
            [0.4993977281025862, -0.024533837163709046]
        ],
        paths =
        [
            [0, 1, 2, 3, 4, 5, 6, 7, 8, 9, 10, 11, 12, 13, 14, 15, 16, 17, 18, 19, 20, 21, 22, 23, 24, 25, 26, 27, 28, 29, 30, 31, 32, 33, 34, 35, 36, 37, 38, 39, 40, 41, 42, 43, 44, 45, 46, 47, 48, 49, 50, 51, 52, 53, 54, 55, 56, 57, 58, 59, 60, 61, 62, 63, 64, 65, 66, 67, 68, 69, 70, 71, 72, 73, 74, 75, 76, 77, 78, 79, 80, 81, 82, 83, 84, 85, 86, 87, 88, 89, 90, 91, 92, 93, 94, 95, 96, 97, 98, 99, 100, 101, 102, 103, 104, 105, 106, 107, 108, 109, 110, 111, 112, 113, 114, 115, 116, 117, 118, 119, 120, 121, 122, 123, 124, 125, 126, 127]
        ]
    );
}
